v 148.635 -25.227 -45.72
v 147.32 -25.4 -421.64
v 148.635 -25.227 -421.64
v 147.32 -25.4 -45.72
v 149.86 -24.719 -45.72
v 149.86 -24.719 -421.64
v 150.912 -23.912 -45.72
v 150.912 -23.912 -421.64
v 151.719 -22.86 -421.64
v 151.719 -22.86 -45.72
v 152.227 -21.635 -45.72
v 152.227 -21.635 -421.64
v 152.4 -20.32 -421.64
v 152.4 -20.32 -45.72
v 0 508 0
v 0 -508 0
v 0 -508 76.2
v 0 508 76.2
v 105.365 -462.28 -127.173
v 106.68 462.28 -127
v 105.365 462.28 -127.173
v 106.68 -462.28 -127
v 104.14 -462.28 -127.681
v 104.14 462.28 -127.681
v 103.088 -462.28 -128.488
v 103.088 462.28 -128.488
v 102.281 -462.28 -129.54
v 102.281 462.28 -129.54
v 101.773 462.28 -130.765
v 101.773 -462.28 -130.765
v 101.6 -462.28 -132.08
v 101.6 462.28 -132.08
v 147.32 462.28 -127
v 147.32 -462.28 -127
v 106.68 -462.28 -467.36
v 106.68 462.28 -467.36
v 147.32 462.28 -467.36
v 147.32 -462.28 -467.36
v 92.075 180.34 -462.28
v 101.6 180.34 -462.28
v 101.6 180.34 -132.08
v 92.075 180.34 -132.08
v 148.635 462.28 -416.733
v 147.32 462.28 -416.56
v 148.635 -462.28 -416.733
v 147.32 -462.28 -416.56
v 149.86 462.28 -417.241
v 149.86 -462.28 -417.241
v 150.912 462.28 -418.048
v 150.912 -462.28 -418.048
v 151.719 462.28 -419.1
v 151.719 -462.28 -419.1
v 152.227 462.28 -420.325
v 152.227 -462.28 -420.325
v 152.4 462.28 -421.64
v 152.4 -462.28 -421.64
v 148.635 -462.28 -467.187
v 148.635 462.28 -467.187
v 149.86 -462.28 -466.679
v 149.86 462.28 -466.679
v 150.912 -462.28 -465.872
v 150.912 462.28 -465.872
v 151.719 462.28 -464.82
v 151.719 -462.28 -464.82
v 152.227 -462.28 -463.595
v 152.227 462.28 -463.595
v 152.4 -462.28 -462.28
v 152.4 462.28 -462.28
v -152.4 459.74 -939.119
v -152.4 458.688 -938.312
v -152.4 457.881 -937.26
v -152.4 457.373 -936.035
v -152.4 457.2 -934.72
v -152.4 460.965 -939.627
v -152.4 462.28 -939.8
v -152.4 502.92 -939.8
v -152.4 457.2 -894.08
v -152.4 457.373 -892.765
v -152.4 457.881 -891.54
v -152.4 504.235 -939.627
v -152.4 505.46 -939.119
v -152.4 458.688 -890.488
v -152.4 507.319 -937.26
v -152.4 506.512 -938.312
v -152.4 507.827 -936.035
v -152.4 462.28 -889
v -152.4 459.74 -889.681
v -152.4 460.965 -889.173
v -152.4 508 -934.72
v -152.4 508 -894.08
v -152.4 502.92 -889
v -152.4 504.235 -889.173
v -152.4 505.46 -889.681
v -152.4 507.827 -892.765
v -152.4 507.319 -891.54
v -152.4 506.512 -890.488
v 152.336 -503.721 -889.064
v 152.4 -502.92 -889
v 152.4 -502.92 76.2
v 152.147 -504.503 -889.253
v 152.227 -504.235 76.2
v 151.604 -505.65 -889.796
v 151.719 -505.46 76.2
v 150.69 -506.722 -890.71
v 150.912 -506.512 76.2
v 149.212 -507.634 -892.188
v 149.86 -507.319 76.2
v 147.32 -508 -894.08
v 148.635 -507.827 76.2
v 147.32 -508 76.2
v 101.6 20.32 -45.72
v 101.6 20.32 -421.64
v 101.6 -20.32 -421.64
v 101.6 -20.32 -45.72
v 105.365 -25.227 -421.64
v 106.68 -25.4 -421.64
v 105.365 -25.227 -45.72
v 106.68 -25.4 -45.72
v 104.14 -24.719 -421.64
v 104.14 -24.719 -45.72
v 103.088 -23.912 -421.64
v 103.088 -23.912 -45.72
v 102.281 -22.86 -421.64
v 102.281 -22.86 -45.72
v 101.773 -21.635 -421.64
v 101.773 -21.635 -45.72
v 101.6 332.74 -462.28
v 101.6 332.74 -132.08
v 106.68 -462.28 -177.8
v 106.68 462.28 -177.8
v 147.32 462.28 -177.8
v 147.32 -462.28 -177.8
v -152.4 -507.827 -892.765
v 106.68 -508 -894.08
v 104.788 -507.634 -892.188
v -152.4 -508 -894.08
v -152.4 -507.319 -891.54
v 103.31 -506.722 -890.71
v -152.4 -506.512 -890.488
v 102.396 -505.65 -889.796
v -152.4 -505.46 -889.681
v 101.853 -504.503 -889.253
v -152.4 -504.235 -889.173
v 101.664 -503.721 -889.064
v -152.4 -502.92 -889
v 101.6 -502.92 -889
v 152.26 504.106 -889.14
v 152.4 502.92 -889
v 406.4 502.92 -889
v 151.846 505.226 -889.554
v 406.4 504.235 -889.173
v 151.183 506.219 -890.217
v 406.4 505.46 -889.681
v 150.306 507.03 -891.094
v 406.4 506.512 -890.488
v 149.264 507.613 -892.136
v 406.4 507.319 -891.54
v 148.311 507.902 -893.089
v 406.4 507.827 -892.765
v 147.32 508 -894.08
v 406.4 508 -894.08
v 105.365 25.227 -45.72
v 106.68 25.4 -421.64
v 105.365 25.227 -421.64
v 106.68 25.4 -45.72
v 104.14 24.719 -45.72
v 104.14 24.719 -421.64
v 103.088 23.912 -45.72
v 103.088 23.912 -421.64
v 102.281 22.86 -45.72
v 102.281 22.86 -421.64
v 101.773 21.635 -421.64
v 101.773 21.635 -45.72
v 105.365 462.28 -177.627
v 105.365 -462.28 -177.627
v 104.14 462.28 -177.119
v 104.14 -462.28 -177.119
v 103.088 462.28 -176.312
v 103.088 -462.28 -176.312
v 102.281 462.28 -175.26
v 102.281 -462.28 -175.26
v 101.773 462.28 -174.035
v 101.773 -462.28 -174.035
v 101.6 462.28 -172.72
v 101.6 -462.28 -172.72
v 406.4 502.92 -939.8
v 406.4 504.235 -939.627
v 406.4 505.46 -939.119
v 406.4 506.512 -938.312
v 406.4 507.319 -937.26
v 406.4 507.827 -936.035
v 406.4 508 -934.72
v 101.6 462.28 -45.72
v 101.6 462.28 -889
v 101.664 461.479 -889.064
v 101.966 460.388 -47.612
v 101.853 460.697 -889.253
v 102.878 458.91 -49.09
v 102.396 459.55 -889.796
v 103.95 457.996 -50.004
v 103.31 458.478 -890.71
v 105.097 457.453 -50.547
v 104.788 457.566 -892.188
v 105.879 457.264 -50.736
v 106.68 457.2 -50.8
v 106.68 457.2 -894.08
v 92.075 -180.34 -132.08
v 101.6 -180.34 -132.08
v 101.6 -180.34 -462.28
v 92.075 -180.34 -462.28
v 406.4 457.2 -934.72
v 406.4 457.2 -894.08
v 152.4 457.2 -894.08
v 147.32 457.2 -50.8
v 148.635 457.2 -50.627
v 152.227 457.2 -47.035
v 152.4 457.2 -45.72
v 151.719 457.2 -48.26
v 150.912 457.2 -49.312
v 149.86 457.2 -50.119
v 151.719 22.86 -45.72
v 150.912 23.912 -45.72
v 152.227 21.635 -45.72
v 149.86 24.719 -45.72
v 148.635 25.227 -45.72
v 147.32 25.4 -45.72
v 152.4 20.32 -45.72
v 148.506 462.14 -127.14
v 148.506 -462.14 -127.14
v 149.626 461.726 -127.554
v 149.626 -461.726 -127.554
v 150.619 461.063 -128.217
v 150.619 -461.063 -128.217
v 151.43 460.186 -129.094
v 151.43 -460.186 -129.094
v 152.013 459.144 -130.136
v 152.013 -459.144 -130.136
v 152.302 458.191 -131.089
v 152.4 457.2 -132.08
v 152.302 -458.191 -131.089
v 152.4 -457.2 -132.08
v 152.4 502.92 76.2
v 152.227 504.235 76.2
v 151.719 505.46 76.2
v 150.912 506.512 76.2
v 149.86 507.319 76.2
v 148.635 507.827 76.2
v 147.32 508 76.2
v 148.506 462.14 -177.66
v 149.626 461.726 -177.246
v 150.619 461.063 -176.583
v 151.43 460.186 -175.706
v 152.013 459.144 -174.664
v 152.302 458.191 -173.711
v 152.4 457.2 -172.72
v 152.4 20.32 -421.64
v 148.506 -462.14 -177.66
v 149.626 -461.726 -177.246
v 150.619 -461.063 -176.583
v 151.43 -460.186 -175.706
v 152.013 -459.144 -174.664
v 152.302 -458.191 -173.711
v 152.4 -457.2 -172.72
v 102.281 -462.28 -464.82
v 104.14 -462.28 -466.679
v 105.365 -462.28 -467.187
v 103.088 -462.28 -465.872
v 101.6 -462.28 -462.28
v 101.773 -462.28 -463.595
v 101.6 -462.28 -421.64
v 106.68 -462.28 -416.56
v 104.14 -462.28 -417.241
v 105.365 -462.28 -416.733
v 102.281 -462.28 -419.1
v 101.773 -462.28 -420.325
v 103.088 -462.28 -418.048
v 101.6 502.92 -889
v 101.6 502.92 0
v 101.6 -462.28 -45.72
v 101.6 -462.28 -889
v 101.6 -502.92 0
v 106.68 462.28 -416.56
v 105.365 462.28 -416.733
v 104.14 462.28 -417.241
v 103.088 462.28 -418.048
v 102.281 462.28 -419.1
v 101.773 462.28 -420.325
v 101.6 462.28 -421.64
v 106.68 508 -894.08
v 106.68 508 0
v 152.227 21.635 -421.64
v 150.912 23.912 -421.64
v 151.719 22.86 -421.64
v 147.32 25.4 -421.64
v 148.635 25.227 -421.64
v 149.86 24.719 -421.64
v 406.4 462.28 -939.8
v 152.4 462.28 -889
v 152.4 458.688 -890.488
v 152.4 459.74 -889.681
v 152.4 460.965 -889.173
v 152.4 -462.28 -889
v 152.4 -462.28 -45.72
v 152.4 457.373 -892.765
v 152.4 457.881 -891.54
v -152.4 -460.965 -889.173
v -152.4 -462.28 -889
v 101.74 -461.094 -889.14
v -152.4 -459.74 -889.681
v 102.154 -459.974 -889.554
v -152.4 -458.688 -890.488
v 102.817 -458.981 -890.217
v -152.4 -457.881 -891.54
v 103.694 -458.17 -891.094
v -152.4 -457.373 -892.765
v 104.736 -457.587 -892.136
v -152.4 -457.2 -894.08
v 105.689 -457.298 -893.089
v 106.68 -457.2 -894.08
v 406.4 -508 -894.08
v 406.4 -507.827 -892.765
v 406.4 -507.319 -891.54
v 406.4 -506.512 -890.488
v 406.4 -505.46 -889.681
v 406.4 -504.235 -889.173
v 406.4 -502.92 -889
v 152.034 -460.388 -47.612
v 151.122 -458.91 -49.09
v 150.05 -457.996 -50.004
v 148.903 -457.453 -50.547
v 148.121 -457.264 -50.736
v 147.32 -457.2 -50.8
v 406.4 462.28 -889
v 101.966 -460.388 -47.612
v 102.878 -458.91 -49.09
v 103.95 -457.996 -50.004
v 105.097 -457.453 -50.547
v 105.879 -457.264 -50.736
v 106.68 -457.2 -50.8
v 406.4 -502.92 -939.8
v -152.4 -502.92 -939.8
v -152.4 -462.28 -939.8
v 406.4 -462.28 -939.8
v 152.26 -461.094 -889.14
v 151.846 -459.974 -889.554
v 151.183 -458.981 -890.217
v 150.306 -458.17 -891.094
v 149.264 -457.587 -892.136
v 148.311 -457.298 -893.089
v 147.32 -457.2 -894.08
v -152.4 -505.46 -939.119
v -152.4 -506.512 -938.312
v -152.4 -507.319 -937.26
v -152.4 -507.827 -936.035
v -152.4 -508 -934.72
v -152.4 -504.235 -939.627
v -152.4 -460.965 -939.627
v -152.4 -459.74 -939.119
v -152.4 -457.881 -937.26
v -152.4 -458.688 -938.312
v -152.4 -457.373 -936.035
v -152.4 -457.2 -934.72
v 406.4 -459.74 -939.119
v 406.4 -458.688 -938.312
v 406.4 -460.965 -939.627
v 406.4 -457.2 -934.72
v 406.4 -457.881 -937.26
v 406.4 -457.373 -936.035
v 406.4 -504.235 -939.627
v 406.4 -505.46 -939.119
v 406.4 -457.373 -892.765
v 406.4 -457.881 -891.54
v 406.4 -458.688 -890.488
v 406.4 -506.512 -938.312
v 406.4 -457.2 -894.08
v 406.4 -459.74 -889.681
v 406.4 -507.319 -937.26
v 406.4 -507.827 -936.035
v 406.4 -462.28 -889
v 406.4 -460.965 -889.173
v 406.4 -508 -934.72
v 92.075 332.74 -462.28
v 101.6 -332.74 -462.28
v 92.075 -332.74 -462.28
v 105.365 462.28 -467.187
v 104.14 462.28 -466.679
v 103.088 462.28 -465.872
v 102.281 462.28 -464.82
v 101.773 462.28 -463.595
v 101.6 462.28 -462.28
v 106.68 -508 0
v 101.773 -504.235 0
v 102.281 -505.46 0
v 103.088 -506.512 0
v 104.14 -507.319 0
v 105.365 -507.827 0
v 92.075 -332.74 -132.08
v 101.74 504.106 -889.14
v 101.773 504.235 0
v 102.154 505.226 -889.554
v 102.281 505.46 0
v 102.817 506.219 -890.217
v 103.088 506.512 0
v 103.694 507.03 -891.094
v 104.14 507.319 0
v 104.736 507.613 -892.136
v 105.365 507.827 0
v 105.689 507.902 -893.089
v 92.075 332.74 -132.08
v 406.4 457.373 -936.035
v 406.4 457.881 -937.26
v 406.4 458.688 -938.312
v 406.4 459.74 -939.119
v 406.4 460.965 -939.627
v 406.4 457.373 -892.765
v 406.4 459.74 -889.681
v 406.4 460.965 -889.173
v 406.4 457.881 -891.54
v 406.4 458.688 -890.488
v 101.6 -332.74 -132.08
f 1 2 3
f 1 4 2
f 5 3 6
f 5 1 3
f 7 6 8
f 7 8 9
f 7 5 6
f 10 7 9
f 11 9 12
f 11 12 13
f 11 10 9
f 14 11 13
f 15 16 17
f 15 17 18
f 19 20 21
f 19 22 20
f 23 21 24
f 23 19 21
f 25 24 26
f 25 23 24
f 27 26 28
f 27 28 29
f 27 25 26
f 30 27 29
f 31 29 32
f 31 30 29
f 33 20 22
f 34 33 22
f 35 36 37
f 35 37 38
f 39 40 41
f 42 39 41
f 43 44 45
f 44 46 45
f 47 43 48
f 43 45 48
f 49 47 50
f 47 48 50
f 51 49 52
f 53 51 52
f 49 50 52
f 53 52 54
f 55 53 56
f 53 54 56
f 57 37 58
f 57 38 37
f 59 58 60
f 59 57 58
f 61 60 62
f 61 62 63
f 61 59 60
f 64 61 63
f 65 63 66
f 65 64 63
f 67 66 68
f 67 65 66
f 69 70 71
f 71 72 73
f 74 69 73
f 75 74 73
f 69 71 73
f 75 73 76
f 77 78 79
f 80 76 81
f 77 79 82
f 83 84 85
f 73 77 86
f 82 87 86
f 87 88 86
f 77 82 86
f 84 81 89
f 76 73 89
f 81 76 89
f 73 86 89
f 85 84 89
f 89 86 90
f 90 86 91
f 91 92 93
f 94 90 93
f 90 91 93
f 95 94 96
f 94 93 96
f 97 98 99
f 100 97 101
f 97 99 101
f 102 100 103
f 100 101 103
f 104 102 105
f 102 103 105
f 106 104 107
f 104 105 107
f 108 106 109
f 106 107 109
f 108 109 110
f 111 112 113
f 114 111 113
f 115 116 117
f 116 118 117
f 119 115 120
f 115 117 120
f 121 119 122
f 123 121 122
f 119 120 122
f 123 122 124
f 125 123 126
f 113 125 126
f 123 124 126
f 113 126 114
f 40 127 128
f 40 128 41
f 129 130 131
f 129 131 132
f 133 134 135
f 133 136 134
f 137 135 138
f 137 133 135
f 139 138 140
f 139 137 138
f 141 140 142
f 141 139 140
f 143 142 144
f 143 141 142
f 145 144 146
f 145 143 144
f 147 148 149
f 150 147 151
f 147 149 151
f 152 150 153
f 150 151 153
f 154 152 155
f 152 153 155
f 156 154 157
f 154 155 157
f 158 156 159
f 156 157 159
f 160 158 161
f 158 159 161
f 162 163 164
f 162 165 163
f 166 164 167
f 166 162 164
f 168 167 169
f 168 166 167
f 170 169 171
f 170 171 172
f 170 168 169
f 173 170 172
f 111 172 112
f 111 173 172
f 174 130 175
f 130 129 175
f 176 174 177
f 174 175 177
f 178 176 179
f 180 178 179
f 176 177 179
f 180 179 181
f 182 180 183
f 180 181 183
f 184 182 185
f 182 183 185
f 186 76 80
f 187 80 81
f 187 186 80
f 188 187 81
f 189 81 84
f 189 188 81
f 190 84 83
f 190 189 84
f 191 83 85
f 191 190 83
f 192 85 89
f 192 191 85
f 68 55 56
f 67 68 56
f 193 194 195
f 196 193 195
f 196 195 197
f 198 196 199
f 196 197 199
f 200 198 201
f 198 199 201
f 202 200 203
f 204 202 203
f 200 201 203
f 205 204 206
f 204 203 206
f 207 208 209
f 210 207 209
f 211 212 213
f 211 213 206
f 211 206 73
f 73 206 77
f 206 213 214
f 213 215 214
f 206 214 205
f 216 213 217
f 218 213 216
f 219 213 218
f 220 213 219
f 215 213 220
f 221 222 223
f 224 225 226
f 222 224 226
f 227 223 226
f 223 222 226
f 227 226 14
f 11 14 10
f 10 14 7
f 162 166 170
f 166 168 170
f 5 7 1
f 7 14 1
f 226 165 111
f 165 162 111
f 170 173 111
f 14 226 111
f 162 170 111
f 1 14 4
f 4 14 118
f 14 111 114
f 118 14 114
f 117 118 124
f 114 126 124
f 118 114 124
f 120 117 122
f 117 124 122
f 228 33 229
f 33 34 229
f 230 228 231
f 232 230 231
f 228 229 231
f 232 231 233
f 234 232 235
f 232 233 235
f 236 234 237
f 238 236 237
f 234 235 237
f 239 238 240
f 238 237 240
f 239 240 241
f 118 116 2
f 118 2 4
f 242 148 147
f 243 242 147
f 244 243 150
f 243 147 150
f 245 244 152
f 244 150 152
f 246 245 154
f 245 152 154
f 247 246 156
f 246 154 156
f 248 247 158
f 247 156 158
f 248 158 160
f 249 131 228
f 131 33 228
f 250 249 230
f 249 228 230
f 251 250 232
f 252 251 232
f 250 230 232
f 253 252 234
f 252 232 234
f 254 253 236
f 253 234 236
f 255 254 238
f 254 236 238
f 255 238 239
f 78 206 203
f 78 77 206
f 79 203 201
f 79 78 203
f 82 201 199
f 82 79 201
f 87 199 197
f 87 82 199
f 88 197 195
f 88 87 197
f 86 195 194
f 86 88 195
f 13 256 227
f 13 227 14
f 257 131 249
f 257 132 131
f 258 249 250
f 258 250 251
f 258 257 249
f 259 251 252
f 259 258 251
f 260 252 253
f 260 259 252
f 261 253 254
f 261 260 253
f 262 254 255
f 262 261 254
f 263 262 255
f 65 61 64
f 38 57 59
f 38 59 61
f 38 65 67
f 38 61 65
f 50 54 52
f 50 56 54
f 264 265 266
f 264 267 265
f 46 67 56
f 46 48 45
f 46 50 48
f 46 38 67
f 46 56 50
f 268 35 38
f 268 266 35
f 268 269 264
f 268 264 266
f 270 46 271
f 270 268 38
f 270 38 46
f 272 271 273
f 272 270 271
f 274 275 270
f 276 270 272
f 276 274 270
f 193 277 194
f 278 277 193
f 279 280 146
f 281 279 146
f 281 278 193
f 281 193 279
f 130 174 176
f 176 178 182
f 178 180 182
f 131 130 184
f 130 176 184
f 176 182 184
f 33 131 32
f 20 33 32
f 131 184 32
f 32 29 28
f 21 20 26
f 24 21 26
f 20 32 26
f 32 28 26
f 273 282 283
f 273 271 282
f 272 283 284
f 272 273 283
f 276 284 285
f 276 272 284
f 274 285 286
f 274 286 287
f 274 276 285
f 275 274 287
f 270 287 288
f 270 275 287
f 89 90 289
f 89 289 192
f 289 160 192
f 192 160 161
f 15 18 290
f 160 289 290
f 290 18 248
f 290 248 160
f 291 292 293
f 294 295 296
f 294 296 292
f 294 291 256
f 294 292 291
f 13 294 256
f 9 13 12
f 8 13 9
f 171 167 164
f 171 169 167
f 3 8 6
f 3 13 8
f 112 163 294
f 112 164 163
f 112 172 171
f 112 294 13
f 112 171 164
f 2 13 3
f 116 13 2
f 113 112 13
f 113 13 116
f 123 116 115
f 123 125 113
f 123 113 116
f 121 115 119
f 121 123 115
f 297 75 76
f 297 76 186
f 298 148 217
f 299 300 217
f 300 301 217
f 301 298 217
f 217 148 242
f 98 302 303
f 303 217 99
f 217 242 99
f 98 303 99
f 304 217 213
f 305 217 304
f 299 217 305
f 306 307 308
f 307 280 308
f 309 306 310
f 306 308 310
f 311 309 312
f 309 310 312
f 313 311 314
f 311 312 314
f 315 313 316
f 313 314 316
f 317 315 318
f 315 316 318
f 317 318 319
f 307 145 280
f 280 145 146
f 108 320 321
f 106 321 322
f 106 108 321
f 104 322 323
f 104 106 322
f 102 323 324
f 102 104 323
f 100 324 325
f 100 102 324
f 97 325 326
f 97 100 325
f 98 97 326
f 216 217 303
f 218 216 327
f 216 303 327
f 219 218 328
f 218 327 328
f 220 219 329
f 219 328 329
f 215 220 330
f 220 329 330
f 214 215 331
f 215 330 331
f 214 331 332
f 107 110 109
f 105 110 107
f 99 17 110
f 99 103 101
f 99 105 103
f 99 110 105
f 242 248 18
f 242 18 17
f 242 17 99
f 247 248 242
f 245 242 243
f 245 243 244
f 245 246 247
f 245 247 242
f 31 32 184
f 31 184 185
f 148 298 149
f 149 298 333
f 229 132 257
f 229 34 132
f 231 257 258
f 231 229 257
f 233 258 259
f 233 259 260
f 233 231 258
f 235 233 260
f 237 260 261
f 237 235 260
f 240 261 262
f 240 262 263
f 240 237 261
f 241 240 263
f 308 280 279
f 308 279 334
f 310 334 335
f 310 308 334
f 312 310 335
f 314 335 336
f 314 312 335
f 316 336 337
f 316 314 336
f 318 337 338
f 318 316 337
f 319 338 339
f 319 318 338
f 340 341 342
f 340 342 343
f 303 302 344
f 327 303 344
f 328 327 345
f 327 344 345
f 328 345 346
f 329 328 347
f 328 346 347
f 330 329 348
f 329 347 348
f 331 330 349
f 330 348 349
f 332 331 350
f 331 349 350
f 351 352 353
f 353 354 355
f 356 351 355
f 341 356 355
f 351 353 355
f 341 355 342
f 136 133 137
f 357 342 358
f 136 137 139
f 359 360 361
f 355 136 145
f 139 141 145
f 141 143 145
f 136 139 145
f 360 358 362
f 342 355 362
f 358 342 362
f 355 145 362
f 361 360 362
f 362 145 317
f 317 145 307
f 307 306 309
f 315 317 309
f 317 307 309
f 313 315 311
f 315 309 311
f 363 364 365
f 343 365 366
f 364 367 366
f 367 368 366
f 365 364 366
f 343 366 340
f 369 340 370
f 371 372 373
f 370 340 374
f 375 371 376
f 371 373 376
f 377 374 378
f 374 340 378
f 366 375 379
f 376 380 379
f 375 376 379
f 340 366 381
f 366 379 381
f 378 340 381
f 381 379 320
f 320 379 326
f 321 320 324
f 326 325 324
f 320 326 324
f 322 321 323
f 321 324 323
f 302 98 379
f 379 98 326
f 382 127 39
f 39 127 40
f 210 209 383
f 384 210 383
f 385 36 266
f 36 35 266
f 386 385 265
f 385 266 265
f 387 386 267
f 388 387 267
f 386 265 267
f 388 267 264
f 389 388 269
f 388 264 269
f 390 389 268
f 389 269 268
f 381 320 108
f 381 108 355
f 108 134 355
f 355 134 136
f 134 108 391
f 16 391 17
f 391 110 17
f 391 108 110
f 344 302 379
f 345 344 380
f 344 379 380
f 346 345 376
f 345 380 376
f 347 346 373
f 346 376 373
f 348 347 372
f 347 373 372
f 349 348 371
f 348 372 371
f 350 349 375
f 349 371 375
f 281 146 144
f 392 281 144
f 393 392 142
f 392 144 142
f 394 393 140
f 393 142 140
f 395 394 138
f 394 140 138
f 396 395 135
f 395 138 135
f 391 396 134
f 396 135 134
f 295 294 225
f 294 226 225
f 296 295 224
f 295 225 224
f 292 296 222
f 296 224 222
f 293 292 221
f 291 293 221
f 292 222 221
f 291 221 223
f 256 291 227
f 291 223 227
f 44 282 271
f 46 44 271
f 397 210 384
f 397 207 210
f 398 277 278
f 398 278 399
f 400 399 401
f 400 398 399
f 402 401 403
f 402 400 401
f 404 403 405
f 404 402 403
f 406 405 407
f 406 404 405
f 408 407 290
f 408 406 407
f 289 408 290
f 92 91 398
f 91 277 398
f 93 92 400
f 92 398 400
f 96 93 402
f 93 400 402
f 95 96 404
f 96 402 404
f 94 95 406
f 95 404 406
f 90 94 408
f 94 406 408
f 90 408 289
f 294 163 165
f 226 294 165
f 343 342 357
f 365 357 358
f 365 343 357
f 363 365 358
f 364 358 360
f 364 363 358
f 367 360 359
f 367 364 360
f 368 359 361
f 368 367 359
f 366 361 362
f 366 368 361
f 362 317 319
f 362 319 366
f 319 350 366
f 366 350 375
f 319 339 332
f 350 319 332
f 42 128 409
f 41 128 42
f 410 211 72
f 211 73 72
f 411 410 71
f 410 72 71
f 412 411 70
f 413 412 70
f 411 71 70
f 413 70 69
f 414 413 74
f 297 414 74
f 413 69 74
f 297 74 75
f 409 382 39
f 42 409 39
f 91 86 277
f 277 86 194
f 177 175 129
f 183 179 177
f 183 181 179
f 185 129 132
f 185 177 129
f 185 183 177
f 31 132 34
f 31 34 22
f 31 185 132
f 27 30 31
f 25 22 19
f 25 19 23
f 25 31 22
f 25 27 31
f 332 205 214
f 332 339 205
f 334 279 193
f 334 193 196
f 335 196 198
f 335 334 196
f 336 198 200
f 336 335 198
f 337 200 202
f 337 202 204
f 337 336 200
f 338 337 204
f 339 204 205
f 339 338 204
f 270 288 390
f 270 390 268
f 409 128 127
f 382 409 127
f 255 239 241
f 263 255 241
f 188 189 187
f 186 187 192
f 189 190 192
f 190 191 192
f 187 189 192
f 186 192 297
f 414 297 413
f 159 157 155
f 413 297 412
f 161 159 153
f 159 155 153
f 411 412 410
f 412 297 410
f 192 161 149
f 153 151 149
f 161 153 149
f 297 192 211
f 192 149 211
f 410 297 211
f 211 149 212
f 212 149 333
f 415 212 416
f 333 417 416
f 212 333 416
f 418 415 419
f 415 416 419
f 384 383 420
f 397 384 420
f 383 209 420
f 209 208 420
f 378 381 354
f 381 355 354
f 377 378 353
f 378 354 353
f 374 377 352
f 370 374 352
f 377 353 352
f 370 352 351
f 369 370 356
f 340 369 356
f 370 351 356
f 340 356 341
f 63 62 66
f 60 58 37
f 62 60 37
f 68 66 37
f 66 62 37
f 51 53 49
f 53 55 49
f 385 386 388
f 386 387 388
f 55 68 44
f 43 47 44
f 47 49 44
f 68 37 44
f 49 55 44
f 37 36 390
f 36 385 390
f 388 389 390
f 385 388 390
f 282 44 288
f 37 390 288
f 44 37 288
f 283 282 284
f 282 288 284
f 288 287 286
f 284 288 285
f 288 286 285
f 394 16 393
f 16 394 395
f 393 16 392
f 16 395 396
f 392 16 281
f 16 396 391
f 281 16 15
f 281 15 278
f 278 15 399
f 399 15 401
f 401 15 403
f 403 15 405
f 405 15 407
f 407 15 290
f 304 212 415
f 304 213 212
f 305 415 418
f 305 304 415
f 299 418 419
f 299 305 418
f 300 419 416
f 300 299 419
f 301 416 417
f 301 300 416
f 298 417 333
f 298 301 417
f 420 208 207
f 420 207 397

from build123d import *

# Parameters (mm, degrees)
F0_W      = 152.4
F0_H      = 1016
F1_DEPTH  = 76.2
F4_W      = 50.8
F4_H      = 914.4
F5_DEPTH  = 50.8
F6_R      = 5.08
F2_W      = 50.8
F2_H      = 50.8
F7_DEPTH  = 889
F3_W      = 50.8
F3_H      = 50.8
F8_DEPTH  = 889
F9_R      = 5.08
F10_W     = 924.56
F10_H     = 50.8
F11_DEPTH = 50.8
F12_R     = 5.08
F13_W     = 924.56
F13_H     = 50.8
F14_DEPTH = 50.8
F15_R     = 5.08
F16_W     = 50.8
F16_H     = 375.92
F17_DEPTH = 50.8
F18_R     = 5.08
F19_W     = 152.4
F19_H     = 40.64
F19_H_2   = 289.56
F20_DEPTH = 9.525
F21_W     = 152.4
F21_H     = 289.56
F21_H_2   = 40.64
F22_DEPTH = 9.525
F24_DEPTH = 50.8
F25_R     = 5.08
F27_DEPTH = 50.8
F28_R     = 5.08


with BuildPart() as f1:
    # F0 (on Top) → F1 (new body)
    with BuildSketch(Plane.XY):
        with Locations((76.2, 0)):
            Rectangle(F0_W, F0_H)
    extrude(amount=F1_DEPTH)

    # F4 (on face) → F5 (join)
    with BuildSketch(Plane(origin=(0, 0, 0), x_dir=(1, 0, 0), z_dir=(0, 0, -1))):
        with Locations((127, 0)):
            Rectangle(F4_W, F4_H)
    extrude(amount=F5_DEPTH)

    # F6
    f6_edges = [f1.edges().sort_by_distance(p)[0] for p in [
        (101.6, 0, -50.8),
        (152.4, 0, -50.8),
    ]]
    fillet(f6_edges, radius=F6_R)

    # F2 (on face) → F7 (join)
    with BuildSketch(Plane(origin=(0, 0, 0), x_dir=(1, 0, 0), z_dir=(0, 0, -1))):
        with Locations((127, 482.6)):
            Rectangle(F2_W, F2_H)
    extrude(amount=F7_DEPTH)

    # F3 (on face) → F8 (join)
    with BuildSketch(Plane(origin=(0, 0, 0), x_dir=(1, 0, 0), z_dir=(0, 0, -1))):
        with Locations((127, -482.6)):
            Rectangle(F3_W, F3_H)
    extrude(amount=F8_DEPTH)

    # F9
    f9_edges = [f1.edges().sort_by_distance(p)[0] for p in [
        (101.6, -457.2, -467.36),
        (152.4, -457.2, -467.36),
        (101.6, -508, -444.5),
        (152.4, -508, -406.4),
        (152.4, 508, -406.4),
        (101.6, 508, -444.5),
        (101.6, 457.2, -467.36),
    ]]
    fillet(f9_edges, radius=F9_R)

    # F23 (on face) → F24 (join)
    with BuildSketch(Plane(origin=(0, 0, -889), x_dir=(1, 0, 0), z_dir=(0, 0, -1))):
        with BuildLine():
            Line((406.4, 508), (147.32, 508))
            ThreePointArc((147.32, 508), (150.9121024484, 506.5121024484), (152.4, 502.92))
            Line((152.4, 502.92), (152.4, 462.28))
            ThreePointArc((152.4, 462.28), (150.9121024484, 458.6878975516), (147.32, 457.2))
            Line((147.32, 457.2), (406.4, 457.2))
            Line((406.4, 457.2), (406.4, 508))
        make_face()
        with BuildLine():
            Line((147.32, 508), (106.68, 508))
            ThreePointArc((106.68, 508), (103.0878975516, 506.5121024484), (101.6, 502.92))
            Line((101.6, 502.92), (101.6, 462.28))
            ThreePointArc((101.6, 462.28), (103.0878975516, 458.6878975516), (106.68, 457.2))
            Line((106.68, 457.2), (147.32, 457.2))
            ThreePointArc((147.32, 457.2), (150.9121024484, 458.6878975516), (152.4, 462.28))
            Line((152.4, 462.28), (152.4, 502.92))
            ThreePointArc((152.4, 502.92), (150.9121024484, 506.5121024484), (147.32, 508))
        make_face()
        with BuildLine():
            Line((106.68, 508), (-152.4, 508))
            Line((-152.4, 508), (-152.4, 457.2))
            Line((-152.4, 457.2), (106.68, 457.2))
            ThreePointArc((106.68, 457.2), (103.0878975516, 458.6878975516), (101.6, 462.28))
            Line((101.6, 462.28), (101.6, 502.92))
            ThreePointArc((101.6, 502.92), (103.0878975516, 506.5121024484), (106.68, 508))
        make_face()
    extrude(amount=F24_DEPTH)

    # F25
    f25_edges = [f1.edges().sort_by_distance(p)[0] for p in [
        (-22.86, -508, -889),
        (127, -508, -939.8),
        (276.86, -508, -889),
        (-22.86, -457.2, -889),
        (276.86, -457.2, -889),
        (127, -457.2, -939.8),
    ]]
    fillet(f25_edges, radius=F25_R)

    # F26 (on face) → F27 (join)
    with BuildSketch(Plane(origin=(0, 0, -889), x_dir=(1, 0, 0), z_dir=(0, 0, -1))):
        with BuildLine():
            Line((406.4, -457.2), (152.4, -457.2))
            Line((152.4, -457.2), (152.4, -502.92))
            ThreePointArc((152.4, -502.92), (150.9121024484, -506.5121024484), (147.32, -508))
            Line((147.32, -508), (406.4, -508))
            Line((406.4, -508), (406.4, -457.2))
        make_face()
        with BuildLine():
            Line((152.4, -457.2), (106.68, -457.2))
            ThreePointArc((106.68, -457.2), (103.0878975516, -458.6878975516), (101.6, -462.28))
            Line((101.6, -462.28), (101.6, -502.92))
            ThreePointArc((101.6, -502.92), (103.0878975516, -506.5121024484), (106.68, -508))
            Line((106.68, -508), (147.32, -508))
            ThreePointArc((147.32, -508), (150.9121024484, -506.5121024484), (152.4, -502.92))
            Line((152.4, -502.92), (152.4, -457.2))
        make_face()
        with BuildLine():
            Line((106.68, -457.2), (-152.4, -457.2))
            Line((-152.4, -457.2), (-152.4, -508))
            Line((-152.4, -508), (106.68, -508))
            ThreePointArc((106.68, -508), (103.0878975516, -506.5121024484), (101.6, -502.92))
            Line((101.6, -502.92), (101.6, -462.28))
            ThreePointArc((101.6, -462.28), (103.0878975516, -458.6878975516), (106.68, -457.2))
        make_face()
    extrude(amount=F27_DEPTH)

    # F28
    f28_edges = [f1.edges().sort_by_distance(p)[0] for p in [
        (127, 457.2, -939.8),
        (127, 508, -939.8),
        (-22.86, 457.2, -889),
        (279.4, 457.2, -889),
        (-22.86, 508, -889),
        (276.86, 508, -889),
    ]]
    fillet(f28_edges, radius=F28_R)


with BuildPart() as f11:
    # F10 (on face) → F11 (new body)
    with BuildSketch(Plane(origin=(101.6, 0, 0), x_dir=(0, -1, 0), z_dir=(-1, 0, 0))):
        with Locations((0, -152.4)):
            Rectangle(F10_W, F10_H)
    extrude(amount=-F11_DEPTH)

    # F12
    f12_edges = [f11.edges().sort_by_distance(p)[0] for p in [
        (101.6, 0, -127),
        (101.6, 0, -177.8),
        (152.4, 0, -127),
        (152.4, 462.28, -152.4),
        (152.4, 0, -177.8),
        (152.4, -462.28, -152.4),
    ]]
    fillet(f12_edges, radius=F12_R)


with BuildPart() as f14:
    # F13 (on face) → F14 (new body)
    with BuildSketch(Plane(origin=(101.6, 0, 0), x_dir=(0, -1, 0), z_dir=(-1, 0, 0))):
        with Locations((0, -441.96)):
            Rectangle(F13_W, F13_H)
    extrude(amount=-F14_DEPTH)

    # F15
    f15_edges = [f14.edges().sort_by_distance(p)[0] for p in [
        (101.6, 0, -416.56),
        (101.6, 0, -467.36),
        (152.4, 0, -467.36),
        (152.4, 0, -416.56),
    ]]
    fillet(f15_edges, radius=F15_R)


with BuildPart() as f17:
    # F16 (on face) → F17 (new body)
    with BuildSketch(Plane(origin=(101.6, 0, 0), x_dir=(0, -1, 0), z_dir=(-1, 0, 0))):
        with Locations((0, -233.68)):
            Rectangle(F16_W, F16_H)
    extrude(amount=-F17_DEPTH)

    # F18
    f18_edges = [f17.edges().sort_by_distance(p)[0] for p in [
        (101.6, -25.4, -233.68),
        (101.6, 25.4, -233.68),
        (152.4, -25.4, -233.68),
        (152.4, 25.4, -233.68),
    ]]
    fillet(f18_edges, radius=F18_R)


with BuildPart() as f20:
    # F19 (on face) → F20 (new body)
    with BuildSketch(Plane(origin=(101.6, 0, 0), x_dir=(0, -1, 0), z_dir=(-1, 0, 0))):
        with Locations((-256.54, -152.4)):
            Rectangle(F19_W, F19_H)
        with Locations((-256.54, -317.5)):
            Rectangle(F19_W, F19_H_2)
    extrude(amount=F20_DEPTH)


with BuildPart() as f22:
    # F21 (on face) → F22 (new body)
    with BuildSketch(Plane(origin=(101.6, 0, 0), x_dir=(0, -1, 0), z_dir=(-1, 0, 0))):
        with Locations((256.54, -317.5)):
            Rectangle(F21_W, F21_H)
        with Locations((256.54, -152.4)):
            Rectangle(F21_W, F21_H_2)
    extrude(amount=F22_DEPTH)


solid = Compound([f1.part, f11.part, f14.part, f17.part, f20.part, f22.part])
